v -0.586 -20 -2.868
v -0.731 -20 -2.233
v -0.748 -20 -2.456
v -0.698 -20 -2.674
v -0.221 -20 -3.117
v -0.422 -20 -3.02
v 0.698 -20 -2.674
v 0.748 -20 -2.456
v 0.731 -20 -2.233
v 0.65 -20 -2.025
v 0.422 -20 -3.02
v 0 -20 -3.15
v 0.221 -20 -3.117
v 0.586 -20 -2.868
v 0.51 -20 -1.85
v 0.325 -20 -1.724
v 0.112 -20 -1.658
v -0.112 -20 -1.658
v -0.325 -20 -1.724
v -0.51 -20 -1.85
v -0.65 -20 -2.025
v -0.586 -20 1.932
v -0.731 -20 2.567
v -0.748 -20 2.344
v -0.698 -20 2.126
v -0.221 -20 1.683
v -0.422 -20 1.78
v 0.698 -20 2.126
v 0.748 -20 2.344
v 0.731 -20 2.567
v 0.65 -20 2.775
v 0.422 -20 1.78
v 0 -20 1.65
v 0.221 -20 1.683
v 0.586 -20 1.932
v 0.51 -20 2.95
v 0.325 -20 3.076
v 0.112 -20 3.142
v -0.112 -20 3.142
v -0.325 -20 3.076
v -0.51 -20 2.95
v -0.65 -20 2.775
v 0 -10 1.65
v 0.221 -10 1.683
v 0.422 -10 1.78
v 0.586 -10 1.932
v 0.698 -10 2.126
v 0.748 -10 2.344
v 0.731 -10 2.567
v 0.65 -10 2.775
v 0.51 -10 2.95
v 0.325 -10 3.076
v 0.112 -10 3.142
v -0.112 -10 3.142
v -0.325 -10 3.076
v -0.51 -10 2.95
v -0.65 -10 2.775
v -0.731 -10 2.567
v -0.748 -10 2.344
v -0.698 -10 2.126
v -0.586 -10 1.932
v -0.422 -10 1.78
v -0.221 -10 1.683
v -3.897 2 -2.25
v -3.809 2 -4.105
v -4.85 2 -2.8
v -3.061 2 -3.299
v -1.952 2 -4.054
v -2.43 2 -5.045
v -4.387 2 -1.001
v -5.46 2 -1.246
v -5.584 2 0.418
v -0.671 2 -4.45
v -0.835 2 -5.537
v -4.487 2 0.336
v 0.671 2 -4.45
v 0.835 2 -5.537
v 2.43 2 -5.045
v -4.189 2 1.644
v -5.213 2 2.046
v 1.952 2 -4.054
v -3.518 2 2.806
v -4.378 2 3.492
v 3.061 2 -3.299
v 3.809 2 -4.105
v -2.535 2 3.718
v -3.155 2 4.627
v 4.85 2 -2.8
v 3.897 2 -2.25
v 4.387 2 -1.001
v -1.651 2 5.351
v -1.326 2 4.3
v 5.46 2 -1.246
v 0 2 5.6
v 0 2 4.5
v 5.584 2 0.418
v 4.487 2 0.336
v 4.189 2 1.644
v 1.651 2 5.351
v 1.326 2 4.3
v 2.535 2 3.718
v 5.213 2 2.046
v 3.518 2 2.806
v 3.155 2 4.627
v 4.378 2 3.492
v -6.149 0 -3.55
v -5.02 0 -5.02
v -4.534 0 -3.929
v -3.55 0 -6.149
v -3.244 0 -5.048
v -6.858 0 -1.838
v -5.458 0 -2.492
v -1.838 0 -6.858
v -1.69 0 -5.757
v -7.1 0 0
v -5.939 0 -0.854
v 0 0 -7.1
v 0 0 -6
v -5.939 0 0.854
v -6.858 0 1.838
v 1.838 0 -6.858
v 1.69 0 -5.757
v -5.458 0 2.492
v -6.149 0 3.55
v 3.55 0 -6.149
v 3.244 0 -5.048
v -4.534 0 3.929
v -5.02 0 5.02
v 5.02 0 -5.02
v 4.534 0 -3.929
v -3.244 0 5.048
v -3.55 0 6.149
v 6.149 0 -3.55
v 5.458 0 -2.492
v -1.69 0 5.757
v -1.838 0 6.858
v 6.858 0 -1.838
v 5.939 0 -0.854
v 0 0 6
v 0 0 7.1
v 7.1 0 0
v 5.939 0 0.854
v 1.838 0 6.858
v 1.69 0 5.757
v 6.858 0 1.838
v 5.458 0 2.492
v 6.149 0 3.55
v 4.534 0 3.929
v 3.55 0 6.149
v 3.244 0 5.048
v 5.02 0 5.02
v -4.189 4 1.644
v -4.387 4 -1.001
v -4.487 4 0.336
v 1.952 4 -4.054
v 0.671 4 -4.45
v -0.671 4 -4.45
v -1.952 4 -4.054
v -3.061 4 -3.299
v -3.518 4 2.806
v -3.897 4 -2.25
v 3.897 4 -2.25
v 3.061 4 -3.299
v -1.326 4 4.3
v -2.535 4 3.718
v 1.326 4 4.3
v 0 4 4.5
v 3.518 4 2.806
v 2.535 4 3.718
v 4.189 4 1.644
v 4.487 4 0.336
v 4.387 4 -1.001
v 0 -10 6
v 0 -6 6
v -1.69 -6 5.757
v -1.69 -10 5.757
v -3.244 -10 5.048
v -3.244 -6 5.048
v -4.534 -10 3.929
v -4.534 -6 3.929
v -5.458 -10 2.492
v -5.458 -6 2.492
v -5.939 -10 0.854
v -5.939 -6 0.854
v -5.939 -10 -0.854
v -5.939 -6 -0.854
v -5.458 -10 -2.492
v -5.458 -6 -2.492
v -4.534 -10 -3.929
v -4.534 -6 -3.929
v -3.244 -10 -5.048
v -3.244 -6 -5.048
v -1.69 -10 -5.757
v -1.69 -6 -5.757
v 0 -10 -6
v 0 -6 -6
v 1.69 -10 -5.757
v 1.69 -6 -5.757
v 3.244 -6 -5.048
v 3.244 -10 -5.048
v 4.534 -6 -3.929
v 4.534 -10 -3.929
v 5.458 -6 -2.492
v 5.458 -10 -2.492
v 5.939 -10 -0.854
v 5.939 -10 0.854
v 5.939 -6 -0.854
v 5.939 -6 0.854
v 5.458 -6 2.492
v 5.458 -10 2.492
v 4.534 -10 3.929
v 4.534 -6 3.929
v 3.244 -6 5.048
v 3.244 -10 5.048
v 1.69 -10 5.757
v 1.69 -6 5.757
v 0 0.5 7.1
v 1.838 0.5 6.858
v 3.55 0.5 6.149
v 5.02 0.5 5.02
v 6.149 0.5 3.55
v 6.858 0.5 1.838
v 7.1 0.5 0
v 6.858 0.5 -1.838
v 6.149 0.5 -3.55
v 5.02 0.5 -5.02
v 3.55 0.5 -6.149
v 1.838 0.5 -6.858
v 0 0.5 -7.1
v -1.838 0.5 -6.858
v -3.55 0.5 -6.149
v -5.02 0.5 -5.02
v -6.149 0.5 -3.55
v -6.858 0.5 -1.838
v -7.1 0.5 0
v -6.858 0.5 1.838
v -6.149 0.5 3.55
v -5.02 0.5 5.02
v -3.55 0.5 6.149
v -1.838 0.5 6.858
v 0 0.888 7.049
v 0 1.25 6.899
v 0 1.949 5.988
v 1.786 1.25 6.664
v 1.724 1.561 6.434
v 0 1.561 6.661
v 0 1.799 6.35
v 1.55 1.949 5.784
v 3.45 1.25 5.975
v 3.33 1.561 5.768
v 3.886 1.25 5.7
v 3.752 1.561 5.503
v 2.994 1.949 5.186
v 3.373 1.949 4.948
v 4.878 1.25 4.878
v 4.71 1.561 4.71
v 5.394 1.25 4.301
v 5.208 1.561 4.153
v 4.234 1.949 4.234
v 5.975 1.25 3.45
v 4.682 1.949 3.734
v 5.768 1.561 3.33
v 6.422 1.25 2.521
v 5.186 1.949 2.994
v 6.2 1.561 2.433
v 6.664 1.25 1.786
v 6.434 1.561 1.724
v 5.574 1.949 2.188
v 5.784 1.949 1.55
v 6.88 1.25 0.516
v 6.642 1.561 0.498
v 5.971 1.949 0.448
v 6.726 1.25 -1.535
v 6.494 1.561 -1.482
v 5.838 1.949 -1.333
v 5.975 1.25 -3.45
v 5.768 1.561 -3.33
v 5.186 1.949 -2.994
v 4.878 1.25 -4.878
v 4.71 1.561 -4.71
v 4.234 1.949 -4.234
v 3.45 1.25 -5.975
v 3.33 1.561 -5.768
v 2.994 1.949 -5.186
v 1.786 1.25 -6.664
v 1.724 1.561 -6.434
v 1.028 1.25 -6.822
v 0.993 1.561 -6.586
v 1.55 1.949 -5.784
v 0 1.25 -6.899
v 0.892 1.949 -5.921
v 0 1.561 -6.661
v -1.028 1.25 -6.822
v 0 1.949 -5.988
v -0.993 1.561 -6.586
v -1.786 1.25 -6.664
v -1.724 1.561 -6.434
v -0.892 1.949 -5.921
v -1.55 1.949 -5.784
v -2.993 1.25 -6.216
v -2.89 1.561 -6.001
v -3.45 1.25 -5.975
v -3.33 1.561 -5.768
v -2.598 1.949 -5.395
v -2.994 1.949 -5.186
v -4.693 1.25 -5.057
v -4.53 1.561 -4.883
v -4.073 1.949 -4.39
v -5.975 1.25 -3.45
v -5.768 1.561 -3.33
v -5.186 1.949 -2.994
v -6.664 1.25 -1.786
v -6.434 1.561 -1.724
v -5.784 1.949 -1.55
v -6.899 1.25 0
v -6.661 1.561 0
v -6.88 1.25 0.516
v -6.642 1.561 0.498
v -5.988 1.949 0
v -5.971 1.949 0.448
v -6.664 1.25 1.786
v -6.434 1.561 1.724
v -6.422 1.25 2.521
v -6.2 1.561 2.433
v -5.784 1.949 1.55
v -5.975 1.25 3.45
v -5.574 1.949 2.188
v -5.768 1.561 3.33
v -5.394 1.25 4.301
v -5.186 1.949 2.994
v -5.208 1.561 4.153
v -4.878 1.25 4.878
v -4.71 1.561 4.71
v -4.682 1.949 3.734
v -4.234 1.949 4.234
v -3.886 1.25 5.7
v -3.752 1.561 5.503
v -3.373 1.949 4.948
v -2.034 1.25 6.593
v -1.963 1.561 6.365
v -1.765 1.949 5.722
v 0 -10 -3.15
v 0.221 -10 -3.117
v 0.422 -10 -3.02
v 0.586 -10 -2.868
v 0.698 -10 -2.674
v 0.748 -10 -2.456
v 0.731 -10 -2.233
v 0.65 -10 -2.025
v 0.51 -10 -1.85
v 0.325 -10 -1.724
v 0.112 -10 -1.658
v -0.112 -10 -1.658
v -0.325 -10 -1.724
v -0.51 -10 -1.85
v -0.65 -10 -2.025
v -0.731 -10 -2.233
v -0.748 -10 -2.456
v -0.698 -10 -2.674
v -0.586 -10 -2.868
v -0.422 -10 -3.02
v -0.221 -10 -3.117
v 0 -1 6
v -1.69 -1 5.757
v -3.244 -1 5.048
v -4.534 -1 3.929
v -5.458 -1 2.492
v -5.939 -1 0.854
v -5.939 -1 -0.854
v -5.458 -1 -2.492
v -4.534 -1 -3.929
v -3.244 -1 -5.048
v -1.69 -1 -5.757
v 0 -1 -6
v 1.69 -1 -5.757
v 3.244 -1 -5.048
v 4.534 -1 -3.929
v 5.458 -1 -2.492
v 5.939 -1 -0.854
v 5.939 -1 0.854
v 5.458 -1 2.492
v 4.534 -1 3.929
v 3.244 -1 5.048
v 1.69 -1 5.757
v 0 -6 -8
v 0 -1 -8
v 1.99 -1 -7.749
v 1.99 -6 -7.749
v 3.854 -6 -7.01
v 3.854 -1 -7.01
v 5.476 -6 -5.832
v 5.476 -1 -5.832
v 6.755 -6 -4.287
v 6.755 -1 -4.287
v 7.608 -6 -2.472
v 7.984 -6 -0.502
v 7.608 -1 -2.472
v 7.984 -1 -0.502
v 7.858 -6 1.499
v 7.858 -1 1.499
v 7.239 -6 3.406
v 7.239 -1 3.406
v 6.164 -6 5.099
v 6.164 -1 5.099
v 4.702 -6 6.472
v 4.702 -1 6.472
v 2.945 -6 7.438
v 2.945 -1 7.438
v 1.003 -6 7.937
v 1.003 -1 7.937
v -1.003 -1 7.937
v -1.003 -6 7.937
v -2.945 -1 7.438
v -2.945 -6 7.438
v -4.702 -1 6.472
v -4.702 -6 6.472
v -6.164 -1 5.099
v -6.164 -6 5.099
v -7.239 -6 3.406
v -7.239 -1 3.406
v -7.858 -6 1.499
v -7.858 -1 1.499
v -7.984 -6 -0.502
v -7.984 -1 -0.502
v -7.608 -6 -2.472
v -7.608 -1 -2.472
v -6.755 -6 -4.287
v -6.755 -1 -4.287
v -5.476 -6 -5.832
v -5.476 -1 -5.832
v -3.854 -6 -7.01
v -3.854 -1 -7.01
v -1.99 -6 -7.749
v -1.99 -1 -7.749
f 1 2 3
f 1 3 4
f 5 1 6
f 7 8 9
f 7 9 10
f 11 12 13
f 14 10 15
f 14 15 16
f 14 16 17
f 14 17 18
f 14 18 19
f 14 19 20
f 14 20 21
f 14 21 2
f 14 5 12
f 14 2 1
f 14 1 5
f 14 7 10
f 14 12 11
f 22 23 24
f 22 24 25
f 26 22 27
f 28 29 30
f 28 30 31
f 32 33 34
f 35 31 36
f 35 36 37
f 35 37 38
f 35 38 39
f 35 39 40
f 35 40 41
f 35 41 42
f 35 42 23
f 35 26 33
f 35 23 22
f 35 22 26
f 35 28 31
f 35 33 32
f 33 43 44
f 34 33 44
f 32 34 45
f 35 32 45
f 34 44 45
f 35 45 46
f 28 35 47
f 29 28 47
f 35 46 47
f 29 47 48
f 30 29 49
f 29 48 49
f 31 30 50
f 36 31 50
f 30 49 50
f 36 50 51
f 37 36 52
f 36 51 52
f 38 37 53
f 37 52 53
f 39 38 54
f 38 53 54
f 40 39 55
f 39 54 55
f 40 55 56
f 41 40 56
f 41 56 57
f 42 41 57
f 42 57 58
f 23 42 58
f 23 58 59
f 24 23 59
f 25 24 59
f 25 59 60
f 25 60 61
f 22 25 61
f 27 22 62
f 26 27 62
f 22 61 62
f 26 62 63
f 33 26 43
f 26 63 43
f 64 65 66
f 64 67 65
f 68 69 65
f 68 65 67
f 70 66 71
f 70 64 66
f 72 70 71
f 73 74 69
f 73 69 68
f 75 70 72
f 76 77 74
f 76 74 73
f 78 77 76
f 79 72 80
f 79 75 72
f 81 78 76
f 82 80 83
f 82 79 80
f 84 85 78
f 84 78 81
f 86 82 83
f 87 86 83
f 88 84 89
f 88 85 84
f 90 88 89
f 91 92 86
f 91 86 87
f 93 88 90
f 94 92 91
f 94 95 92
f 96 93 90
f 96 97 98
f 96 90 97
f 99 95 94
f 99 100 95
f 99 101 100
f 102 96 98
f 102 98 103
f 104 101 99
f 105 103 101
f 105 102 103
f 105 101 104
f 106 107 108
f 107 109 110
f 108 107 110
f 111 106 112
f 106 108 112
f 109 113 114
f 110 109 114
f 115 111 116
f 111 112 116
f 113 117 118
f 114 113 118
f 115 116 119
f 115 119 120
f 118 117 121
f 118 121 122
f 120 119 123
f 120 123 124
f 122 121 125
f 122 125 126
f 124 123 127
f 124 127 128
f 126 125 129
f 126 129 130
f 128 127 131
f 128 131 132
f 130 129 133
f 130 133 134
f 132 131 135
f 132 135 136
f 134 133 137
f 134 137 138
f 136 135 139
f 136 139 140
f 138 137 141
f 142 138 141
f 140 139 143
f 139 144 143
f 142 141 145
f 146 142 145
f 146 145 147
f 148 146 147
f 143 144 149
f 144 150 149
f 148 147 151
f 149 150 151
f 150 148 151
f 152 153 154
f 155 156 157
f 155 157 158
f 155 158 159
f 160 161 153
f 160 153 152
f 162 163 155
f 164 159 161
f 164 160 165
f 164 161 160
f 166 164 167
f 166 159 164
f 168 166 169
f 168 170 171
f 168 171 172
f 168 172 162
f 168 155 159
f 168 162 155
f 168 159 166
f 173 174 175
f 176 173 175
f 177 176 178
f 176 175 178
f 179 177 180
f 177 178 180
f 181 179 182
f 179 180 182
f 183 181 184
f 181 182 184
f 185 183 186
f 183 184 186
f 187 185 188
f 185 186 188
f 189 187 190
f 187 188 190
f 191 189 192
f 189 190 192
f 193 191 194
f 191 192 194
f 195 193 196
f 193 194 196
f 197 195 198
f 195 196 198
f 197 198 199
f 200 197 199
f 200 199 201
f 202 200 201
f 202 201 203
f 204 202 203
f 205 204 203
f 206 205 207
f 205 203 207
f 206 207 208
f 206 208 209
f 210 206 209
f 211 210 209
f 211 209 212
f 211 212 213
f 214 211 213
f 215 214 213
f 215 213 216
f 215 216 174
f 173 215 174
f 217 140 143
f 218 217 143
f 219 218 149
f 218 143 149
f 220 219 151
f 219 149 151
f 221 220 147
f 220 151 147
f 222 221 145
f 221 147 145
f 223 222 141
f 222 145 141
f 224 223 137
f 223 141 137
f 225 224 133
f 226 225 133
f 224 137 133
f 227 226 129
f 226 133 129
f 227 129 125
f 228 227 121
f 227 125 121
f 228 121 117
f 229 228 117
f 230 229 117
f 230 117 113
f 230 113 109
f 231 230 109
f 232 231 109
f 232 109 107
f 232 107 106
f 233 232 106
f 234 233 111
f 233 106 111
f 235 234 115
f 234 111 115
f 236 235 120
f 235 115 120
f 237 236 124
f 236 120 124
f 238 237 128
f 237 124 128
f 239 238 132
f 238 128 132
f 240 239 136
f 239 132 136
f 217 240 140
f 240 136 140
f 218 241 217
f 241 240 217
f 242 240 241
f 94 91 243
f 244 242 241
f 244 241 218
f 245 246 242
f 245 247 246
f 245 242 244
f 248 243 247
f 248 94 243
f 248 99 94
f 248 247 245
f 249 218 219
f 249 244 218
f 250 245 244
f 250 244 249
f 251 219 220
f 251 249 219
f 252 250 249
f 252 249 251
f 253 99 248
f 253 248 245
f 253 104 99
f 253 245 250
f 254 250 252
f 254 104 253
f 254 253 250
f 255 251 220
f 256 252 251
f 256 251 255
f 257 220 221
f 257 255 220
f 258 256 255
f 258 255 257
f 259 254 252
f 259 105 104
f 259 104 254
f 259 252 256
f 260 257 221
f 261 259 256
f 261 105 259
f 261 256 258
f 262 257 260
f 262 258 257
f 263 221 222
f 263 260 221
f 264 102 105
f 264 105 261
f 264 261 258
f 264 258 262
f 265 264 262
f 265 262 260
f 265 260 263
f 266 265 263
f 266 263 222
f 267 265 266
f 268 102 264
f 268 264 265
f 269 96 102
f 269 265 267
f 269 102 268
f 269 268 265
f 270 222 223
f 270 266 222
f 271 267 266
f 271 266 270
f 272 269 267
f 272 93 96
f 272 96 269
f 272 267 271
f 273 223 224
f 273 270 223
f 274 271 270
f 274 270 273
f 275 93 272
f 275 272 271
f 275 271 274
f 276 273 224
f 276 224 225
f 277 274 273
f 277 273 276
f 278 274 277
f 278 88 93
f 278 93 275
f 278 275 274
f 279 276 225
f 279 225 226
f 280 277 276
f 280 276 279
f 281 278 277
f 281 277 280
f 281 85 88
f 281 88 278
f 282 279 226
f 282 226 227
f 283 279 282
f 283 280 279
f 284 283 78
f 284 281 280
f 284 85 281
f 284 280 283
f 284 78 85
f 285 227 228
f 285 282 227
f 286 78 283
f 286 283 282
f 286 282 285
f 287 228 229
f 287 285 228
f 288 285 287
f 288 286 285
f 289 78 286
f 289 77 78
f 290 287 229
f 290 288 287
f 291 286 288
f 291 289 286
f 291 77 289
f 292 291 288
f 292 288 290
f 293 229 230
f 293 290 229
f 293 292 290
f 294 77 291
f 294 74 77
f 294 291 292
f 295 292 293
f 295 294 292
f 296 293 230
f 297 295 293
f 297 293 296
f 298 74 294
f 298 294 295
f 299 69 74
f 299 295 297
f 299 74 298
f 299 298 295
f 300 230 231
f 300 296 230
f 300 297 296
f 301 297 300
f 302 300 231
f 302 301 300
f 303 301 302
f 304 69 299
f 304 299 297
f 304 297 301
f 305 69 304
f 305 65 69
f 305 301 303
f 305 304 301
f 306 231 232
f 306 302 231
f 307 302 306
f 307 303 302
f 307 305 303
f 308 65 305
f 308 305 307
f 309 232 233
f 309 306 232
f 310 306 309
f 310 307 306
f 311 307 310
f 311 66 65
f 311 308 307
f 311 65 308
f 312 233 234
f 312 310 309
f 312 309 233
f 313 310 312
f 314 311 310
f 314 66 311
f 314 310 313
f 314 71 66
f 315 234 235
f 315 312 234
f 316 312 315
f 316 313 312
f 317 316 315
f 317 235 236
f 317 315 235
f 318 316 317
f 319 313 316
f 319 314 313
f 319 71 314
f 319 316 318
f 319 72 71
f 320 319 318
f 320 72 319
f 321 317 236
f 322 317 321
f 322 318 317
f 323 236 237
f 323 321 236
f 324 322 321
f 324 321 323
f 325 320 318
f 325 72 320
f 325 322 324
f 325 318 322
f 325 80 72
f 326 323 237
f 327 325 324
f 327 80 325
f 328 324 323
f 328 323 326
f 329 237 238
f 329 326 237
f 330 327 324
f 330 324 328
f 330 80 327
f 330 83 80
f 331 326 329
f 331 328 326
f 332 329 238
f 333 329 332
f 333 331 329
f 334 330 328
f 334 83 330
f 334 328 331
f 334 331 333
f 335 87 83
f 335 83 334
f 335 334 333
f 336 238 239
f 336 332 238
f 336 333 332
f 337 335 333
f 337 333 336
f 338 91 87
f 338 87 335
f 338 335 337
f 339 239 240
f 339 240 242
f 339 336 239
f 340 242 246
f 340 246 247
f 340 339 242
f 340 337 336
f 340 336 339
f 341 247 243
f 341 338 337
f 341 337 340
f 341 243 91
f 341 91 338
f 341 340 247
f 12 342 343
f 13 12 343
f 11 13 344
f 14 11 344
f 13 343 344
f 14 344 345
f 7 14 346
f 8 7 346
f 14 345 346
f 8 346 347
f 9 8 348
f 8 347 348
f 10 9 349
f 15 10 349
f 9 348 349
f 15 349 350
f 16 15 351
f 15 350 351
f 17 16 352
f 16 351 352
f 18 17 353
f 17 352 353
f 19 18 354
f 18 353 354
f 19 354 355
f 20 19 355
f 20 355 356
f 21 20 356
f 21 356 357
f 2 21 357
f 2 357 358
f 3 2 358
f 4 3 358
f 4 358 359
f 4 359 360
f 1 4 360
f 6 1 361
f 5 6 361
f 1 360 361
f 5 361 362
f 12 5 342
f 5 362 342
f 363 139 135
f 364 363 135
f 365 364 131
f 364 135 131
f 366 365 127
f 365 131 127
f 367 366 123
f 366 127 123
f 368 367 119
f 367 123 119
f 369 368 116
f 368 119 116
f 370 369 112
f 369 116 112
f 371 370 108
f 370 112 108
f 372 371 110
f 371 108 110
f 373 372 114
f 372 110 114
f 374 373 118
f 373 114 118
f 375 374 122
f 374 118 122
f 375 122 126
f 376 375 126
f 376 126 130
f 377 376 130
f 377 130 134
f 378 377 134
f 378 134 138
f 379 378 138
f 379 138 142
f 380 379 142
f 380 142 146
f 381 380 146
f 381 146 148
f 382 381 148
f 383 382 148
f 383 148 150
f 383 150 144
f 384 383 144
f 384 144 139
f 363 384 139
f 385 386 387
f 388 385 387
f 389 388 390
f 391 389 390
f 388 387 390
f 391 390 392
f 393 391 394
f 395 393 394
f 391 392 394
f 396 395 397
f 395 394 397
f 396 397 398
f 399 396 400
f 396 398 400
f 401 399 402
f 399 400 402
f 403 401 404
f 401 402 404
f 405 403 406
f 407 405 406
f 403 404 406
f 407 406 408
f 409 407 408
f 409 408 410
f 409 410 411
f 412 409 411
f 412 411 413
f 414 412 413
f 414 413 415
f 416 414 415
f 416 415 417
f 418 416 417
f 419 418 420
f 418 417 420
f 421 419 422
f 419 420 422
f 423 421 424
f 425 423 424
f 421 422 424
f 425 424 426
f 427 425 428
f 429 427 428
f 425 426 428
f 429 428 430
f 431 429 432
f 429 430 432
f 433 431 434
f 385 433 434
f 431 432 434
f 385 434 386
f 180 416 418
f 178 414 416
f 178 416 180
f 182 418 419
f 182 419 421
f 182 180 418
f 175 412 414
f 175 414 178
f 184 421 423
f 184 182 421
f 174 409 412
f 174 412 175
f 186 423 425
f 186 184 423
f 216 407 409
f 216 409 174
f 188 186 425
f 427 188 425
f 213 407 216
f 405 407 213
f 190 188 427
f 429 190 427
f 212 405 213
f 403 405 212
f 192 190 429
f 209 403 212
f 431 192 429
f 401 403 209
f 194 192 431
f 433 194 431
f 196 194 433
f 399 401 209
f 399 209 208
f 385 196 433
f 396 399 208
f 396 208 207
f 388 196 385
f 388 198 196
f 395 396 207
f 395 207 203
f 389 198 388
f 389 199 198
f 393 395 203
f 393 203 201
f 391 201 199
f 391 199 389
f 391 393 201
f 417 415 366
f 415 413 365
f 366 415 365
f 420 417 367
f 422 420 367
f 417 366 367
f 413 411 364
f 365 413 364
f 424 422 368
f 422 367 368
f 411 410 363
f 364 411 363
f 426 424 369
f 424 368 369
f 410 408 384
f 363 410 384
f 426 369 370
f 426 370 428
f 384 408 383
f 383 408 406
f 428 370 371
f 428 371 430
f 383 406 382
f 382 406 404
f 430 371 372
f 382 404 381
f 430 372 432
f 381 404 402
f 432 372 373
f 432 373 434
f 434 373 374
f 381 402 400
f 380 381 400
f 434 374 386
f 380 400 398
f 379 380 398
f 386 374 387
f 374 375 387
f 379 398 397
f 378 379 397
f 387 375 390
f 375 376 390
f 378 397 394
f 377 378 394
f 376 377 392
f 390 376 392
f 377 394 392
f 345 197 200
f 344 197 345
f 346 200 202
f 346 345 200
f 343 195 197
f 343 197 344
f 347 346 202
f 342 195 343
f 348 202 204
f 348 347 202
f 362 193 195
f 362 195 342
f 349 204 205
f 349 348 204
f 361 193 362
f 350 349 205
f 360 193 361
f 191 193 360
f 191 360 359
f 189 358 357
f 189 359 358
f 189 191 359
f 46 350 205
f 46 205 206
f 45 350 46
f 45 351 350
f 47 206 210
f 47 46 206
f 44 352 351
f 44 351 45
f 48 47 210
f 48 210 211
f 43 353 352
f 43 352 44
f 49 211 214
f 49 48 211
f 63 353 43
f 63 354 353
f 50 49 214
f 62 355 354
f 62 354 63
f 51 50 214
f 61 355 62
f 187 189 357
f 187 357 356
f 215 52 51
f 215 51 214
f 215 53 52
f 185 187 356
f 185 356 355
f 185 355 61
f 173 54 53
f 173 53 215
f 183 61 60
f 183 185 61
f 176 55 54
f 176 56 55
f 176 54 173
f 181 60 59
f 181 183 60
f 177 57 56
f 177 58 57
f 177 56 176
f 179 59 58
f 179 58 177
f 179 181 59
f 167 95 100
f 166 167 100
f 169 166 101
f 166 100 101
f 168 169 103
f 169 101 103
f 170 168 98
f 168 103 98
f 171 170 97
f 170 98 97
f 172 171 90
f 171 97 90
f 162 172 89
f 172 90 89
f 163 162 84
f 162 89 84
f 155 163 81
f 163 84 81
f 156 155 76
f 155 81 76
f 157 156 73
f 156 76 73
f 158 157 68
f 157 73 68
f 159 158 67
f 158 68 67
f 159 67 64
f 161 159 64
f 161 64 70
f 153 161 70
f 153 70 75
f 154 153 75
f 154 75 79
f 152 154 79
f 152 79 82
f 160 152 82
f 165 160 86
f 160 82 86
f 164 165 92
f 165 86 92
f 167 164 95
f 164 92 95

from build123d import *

# Parameters (mm, degrees)
SKETCH_1_R      = 7.1
EXTRUDE_1_DEPTH = 2
FILLET_1_R      = 1.5
SKETCH_2_R      = 4.5
EXTRUDE_2_DEPTH = 2
SKETCH_3_R      = 6
EXTRUDE_3_DEPTH = 10
SKETCH_4_R      = 0.75
EXTRUDE_4_DEPTH = 10
SKETCH_5_R      = 8
SKETCH_5_R_2    = 6
EXTRUDE_5_DEPTH = 5


with BuildPart() as part:
    # 草图1 → 拉伸1 (new body)
    with BuildSketch(Plane(origin=(0, 0, 0), x_dir=(1, 0, 0), z_dir=(0, 1, 0))):
        with Locations(Location((0, 0, 0), (0, 0, 270))):
            Circle(SKETCH_1_R)
    extrude(amount=EXTRUDE_1_DEPTH)

    # 圆角1
    fillet_1_edges = [part.edges().sort_by_distance(p)[0] for p in [
        (0, 2, -7.1),
    ]]
    fillet(fillet_1_edges, radius=FILLET_1_R)

    # 草图2 → 拉伸2 (add)
    with BuildSketch(Plane(origin=(0, 2, 0), x_dir=(-1, 0, 0), z_dir=(0, 1, 0))):
        with Locations(Location((0, 0, 0), (0, 0, 90))):
            Circle(SKETCH_2_R)
    extrude(amount=EXTRUDE_2_DEPTH)

    # 草图3 → 拉伸3 (add)
    with BuildSketch(Plane.XZ):
        with Locations(Location((0, 0, 0), (0, 0, 90))):
            Circle(SKETCH_3_R)
    extrude(amount=EXTRUDE_3_DEPTH)

    # 草图4 → 拉伸4 (add)
    with BuildSketch(Plane.XZ.offset(10)):
        with Locations(Location((0, -2.4, 0), (0, 0, 270))):
            Circle(SKETCH_4_R)
        with Locations(Location((0, 2.4, 0), (0, 0, 270))):
            Circle(SKETCH_4_R)
    extrude(amount=EXTRUDE_4_DEPTH)

    # 草图5 → 拉伸5 (add)
    with BuildSketch(Plane.XZ.offset(1)):
        with Locations(Location((0, 0, 0), (0, 0, 270))):
            Circle(SKETCH_5_R)
        with Locations(Location((0, 0, 0), (0, 0, 90))):
            Circle(SKETCH_5_R_2, mode=Mode.SUBTRACT)
    extrude(amount=EXTRUDE_5_DEPTH)


solid = part.part
